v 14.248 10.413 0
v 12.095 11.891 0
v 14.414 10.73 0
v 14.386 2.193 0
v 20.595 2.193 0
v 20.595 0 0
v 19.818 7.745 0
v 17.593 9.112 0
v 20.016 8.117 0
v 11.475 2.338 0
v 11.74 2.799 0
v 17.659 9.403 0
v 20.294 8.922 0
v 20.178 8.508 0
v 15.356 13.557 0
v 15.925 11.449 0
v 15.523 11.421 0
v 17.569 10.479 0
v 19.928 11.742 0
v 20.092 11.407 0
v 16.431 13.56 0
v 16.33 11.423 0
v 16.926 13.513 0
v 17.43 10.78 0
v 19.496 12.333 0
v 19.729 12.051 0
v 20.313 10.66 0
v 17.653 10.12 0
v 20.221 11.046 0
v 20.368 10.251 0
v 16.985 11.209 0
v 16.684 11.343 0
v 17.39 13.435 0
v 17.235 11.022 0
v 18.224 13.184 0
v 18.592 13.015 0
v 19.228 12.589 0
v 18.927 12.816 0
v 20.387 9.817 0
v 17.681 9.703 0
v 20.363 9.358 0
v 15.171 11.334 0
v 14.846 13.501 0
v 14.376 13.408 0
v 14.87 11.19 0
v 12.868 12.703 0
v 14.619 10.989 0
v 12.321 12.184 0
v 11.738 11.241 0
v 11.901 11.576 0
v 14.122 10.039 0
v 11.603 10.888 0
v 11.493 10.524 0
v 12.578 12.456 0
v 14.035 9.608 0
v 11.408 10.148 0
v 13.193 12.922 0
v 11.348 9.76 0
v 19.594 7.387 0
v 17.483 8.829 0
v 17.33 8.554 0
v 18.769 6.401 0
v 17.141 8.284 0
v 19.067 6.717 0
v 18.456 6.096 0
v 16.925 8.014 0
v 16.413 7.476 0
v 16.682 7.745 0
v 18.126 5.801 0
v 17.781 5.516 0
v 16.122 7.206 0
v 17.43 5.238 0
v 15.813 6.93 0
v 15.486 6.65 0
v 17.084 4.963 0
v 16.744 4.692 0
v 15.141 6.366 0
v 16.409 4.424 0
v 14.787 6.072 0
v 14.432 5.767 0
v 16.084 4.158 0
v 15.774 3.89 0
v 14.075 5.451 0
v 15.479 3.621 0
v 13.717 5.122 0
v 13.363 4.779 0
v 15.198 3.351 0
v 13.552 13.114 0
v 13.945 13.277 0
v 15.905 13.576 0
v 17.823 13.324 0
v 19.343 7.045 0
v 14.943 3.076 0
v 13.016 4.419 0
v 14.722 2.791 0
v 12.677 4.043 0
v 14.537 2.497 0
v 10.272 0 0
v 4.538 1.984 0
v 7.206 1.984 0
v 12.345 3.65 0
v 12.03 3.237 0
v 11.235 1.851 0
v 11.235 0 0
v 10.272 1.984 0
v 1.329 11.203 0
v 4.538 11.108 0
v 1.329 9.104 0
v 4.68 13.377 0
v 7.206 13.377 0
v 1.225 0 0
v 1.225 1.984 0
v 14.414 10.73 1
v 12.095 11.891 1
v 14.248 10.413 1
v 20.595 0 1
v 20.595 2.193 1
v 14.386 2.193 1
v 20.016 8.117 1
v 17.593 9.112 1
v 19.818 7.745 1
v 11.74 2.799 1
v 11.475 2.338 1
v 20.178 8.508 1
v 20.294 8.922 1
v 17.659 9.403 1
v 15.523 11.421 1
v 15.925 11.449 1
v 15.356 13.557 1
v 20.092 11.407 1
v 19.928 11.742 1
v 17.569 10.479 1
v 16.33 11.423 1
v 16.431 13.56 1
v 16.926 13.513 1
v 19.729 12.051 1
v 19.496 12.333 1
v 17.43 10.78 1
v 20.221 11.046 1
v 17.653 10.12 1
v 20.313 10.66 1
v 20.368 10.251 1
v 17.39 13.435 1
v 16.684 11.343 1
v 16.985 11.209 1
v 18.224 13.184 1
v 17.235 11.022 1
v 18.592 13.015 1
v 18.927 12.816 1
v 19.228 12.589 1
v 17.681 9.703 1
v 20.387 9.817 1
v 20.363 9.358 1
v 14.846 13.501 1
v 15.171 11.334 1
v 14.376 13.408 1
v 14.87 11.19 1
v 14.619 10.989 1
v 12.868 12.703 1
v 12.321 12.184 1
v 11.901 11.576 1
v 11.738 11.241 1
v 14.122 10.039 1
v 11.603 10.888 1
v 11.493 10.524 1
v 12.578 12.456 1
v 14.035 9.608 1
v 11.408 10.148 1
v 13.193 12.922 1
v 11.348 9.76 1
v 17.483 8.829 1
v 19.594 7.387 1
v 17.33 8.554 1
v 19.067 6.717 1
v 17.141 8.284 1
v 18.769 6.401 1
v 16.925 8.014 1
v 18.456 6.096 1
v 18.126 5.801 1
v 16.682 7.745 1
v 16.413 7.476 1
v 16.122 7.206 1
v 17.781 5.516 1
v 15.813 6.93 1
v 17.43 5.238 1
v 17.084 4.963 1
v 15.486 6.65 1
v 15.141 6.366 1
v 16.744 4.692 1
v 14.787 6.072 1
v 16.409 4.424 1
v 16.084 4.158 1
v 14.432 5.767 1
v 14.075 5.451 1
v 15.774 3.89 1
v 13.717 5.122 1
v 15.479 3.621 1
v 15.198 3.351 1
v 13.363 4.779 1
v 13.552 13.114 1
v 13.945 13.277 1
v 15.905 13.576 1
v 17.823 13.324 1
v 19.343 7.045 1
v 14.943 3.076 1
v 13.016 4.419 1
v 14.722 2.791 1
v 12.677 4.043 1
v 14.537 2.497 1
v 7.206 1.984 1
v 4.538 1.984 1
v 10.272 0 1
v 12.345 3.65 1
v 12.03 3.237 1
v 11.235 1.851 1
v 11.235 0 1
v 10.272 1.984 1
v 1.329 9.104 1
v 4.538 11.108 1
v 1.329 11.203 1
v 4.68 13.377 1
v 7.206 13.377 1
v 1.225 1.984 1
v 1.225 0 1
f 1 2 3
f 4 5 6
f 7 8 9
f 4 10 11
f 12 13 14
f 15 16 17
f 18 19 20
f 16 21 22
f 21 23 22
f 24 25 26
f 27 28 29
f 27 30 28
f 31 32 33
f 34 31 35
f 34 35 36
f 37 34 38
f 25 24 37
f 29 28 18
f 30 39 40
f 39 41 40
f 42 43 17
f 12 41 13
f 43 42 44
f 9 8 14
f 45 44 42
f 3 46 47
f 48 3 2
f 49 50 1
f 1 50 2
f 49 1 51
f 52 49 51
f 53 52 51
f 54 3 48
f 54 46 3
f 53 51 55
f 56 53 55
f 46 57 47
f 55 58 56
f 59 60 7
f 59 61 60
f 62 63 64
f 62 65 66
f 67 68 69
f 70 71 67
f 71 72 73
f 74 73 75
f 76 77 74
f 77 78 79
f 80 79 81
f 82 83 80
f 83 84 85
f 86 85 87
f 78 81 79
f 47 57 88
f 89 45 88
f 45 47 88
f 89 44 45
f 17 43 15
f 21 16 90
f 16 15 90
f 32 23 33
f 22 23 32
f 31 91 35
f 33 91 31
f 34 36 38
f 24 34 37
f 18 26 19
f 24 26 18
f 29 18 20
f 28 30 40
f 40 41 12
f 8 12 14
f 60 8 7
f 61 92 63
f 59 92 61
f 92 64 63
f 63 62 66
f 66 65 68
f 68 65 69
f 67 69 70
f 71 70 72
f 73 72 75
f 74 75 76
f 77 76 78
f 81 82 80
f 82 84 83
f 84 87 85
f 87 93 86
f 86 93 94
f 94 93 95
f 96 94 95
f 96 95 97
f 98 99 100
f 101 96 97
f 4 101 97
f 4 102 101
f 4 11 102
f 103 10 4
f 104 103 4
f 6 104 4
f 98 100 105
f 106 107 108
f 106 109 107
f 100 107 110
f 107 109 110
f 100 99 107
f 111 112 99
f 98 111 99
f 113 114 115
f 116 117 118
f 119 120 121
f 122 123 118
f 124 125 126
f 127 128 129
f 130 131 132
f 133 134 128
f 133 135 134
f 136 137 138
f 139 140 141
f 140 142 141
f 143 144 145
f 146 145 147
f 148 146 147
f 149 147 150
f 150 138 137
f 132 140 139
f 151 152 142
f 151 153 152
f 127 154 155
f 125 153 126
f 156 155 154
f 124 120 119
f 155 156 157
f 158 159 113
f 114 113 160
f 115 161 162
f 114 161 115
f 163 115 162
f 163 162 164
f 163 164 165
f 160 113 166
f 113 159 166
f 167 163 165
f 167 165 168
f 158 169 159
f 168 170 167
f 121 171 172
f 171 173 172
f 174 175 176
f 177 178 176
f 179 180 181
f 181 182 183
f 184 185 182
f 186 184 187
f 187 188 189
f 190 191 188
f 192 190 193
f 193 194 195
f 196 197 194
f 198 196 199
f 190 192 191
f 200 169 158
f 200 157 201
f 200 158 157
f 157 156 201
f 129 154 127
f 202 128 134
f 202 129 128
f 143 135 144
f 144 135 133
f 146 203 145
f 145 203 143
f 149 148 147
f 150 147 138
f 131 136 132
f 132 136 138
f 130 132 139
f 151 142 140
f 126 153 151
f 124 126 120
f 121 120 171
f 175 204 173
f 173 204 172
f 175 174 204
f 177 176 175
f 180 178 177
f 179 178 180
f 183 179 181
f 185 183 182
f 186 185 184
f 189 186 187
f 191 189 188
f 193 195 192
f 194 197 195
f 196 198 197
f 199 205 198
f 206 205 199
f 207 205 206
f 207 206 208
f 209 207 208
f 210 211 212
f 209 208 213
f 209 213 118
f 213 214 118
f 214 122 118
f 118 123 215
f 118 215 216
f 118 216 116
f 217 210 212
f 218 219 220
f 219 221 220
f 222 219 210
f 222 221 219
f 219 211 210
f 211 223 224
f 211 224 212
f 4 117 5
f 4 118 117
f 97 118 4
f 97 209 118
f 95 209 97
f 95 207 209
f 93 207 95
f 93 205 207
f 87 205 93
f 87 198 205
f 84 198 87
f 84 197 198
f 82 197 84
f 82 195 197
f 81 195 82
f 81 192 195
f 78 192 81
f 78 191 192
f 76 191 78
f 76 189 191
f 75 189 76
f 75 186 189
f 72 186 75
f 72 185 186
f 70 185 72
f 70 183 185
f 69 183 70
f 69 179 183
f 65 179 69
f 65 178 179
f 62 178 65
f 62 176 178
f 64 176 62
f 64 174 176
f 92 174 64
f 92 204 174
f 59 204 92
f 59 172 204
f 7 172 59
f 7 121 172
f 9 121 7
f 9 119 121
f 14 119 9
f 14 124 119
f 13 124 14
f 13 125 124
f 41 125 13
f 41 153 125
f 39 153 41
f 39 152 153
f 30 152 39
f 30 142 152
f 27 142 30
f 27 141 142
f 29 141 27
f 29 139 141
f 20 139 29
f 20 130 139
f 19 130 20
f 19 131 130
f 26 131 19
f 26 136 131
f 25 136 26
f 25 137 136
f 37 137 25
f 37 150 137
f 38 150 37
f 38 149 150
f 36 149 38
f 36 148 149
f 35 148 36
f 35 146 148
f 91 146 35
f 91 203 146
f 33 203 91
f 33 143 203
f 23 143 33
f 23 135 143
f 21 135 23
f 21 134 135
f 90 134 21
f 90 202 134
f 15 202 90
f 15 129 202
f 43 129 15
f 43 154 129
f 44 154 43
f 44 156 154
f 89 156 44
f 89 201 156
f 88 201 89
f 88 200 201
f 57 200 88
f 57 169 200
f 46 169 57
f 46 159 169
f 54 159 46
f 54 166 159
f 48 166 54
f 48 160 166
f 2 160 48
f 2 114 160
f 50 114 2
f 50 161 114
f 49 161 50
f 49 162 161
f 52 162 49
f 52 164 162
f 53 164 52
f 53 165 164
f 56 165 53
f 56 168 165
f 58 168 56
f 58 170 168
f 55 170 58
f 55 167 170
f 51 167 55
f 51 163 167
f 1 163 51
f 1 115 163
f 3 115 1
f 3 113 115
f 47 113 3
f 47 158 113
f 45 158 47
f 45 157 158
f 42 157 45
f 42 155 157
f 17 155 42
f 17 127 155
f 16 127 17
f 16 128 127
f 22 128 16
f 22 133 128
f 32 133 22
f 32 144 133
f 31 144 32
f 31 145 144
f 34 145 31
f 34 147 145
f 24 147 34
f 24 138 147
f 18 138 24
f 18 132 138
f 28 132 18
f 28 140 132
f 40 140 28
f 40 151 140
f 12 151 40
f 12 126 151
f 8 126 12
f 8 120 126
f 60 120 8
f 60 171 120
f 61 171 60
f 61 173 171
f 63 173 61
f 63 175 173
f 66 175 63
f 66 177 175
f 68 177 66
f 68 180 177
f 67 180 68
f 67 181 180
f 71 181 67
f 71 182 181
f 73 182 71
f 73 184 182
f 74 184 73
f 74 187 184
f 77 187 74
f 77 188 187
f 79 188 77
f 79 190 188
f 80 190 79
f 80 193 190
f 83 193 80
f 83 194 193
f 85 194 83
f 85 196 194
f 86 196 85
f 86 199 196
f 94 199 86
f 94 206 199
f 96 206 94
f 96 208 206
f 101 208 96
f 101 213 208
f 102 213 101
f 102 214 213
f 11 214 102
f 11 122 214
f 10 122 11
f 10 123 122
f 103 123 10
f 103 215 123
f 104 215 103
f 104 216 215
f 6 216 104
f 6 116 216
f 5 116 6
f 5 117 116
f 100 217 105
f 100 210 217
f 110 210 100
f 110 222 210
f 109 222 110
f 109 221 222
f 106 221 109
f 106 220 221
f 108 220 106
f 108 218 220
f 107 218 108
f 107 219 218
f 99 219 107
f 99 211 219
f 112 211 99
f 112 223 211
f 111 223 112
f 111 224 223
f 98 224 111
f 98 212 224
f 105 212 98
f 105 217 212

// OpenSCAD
linear_extrude(height=1) text("12", font="Arial:Bold", size=14);
